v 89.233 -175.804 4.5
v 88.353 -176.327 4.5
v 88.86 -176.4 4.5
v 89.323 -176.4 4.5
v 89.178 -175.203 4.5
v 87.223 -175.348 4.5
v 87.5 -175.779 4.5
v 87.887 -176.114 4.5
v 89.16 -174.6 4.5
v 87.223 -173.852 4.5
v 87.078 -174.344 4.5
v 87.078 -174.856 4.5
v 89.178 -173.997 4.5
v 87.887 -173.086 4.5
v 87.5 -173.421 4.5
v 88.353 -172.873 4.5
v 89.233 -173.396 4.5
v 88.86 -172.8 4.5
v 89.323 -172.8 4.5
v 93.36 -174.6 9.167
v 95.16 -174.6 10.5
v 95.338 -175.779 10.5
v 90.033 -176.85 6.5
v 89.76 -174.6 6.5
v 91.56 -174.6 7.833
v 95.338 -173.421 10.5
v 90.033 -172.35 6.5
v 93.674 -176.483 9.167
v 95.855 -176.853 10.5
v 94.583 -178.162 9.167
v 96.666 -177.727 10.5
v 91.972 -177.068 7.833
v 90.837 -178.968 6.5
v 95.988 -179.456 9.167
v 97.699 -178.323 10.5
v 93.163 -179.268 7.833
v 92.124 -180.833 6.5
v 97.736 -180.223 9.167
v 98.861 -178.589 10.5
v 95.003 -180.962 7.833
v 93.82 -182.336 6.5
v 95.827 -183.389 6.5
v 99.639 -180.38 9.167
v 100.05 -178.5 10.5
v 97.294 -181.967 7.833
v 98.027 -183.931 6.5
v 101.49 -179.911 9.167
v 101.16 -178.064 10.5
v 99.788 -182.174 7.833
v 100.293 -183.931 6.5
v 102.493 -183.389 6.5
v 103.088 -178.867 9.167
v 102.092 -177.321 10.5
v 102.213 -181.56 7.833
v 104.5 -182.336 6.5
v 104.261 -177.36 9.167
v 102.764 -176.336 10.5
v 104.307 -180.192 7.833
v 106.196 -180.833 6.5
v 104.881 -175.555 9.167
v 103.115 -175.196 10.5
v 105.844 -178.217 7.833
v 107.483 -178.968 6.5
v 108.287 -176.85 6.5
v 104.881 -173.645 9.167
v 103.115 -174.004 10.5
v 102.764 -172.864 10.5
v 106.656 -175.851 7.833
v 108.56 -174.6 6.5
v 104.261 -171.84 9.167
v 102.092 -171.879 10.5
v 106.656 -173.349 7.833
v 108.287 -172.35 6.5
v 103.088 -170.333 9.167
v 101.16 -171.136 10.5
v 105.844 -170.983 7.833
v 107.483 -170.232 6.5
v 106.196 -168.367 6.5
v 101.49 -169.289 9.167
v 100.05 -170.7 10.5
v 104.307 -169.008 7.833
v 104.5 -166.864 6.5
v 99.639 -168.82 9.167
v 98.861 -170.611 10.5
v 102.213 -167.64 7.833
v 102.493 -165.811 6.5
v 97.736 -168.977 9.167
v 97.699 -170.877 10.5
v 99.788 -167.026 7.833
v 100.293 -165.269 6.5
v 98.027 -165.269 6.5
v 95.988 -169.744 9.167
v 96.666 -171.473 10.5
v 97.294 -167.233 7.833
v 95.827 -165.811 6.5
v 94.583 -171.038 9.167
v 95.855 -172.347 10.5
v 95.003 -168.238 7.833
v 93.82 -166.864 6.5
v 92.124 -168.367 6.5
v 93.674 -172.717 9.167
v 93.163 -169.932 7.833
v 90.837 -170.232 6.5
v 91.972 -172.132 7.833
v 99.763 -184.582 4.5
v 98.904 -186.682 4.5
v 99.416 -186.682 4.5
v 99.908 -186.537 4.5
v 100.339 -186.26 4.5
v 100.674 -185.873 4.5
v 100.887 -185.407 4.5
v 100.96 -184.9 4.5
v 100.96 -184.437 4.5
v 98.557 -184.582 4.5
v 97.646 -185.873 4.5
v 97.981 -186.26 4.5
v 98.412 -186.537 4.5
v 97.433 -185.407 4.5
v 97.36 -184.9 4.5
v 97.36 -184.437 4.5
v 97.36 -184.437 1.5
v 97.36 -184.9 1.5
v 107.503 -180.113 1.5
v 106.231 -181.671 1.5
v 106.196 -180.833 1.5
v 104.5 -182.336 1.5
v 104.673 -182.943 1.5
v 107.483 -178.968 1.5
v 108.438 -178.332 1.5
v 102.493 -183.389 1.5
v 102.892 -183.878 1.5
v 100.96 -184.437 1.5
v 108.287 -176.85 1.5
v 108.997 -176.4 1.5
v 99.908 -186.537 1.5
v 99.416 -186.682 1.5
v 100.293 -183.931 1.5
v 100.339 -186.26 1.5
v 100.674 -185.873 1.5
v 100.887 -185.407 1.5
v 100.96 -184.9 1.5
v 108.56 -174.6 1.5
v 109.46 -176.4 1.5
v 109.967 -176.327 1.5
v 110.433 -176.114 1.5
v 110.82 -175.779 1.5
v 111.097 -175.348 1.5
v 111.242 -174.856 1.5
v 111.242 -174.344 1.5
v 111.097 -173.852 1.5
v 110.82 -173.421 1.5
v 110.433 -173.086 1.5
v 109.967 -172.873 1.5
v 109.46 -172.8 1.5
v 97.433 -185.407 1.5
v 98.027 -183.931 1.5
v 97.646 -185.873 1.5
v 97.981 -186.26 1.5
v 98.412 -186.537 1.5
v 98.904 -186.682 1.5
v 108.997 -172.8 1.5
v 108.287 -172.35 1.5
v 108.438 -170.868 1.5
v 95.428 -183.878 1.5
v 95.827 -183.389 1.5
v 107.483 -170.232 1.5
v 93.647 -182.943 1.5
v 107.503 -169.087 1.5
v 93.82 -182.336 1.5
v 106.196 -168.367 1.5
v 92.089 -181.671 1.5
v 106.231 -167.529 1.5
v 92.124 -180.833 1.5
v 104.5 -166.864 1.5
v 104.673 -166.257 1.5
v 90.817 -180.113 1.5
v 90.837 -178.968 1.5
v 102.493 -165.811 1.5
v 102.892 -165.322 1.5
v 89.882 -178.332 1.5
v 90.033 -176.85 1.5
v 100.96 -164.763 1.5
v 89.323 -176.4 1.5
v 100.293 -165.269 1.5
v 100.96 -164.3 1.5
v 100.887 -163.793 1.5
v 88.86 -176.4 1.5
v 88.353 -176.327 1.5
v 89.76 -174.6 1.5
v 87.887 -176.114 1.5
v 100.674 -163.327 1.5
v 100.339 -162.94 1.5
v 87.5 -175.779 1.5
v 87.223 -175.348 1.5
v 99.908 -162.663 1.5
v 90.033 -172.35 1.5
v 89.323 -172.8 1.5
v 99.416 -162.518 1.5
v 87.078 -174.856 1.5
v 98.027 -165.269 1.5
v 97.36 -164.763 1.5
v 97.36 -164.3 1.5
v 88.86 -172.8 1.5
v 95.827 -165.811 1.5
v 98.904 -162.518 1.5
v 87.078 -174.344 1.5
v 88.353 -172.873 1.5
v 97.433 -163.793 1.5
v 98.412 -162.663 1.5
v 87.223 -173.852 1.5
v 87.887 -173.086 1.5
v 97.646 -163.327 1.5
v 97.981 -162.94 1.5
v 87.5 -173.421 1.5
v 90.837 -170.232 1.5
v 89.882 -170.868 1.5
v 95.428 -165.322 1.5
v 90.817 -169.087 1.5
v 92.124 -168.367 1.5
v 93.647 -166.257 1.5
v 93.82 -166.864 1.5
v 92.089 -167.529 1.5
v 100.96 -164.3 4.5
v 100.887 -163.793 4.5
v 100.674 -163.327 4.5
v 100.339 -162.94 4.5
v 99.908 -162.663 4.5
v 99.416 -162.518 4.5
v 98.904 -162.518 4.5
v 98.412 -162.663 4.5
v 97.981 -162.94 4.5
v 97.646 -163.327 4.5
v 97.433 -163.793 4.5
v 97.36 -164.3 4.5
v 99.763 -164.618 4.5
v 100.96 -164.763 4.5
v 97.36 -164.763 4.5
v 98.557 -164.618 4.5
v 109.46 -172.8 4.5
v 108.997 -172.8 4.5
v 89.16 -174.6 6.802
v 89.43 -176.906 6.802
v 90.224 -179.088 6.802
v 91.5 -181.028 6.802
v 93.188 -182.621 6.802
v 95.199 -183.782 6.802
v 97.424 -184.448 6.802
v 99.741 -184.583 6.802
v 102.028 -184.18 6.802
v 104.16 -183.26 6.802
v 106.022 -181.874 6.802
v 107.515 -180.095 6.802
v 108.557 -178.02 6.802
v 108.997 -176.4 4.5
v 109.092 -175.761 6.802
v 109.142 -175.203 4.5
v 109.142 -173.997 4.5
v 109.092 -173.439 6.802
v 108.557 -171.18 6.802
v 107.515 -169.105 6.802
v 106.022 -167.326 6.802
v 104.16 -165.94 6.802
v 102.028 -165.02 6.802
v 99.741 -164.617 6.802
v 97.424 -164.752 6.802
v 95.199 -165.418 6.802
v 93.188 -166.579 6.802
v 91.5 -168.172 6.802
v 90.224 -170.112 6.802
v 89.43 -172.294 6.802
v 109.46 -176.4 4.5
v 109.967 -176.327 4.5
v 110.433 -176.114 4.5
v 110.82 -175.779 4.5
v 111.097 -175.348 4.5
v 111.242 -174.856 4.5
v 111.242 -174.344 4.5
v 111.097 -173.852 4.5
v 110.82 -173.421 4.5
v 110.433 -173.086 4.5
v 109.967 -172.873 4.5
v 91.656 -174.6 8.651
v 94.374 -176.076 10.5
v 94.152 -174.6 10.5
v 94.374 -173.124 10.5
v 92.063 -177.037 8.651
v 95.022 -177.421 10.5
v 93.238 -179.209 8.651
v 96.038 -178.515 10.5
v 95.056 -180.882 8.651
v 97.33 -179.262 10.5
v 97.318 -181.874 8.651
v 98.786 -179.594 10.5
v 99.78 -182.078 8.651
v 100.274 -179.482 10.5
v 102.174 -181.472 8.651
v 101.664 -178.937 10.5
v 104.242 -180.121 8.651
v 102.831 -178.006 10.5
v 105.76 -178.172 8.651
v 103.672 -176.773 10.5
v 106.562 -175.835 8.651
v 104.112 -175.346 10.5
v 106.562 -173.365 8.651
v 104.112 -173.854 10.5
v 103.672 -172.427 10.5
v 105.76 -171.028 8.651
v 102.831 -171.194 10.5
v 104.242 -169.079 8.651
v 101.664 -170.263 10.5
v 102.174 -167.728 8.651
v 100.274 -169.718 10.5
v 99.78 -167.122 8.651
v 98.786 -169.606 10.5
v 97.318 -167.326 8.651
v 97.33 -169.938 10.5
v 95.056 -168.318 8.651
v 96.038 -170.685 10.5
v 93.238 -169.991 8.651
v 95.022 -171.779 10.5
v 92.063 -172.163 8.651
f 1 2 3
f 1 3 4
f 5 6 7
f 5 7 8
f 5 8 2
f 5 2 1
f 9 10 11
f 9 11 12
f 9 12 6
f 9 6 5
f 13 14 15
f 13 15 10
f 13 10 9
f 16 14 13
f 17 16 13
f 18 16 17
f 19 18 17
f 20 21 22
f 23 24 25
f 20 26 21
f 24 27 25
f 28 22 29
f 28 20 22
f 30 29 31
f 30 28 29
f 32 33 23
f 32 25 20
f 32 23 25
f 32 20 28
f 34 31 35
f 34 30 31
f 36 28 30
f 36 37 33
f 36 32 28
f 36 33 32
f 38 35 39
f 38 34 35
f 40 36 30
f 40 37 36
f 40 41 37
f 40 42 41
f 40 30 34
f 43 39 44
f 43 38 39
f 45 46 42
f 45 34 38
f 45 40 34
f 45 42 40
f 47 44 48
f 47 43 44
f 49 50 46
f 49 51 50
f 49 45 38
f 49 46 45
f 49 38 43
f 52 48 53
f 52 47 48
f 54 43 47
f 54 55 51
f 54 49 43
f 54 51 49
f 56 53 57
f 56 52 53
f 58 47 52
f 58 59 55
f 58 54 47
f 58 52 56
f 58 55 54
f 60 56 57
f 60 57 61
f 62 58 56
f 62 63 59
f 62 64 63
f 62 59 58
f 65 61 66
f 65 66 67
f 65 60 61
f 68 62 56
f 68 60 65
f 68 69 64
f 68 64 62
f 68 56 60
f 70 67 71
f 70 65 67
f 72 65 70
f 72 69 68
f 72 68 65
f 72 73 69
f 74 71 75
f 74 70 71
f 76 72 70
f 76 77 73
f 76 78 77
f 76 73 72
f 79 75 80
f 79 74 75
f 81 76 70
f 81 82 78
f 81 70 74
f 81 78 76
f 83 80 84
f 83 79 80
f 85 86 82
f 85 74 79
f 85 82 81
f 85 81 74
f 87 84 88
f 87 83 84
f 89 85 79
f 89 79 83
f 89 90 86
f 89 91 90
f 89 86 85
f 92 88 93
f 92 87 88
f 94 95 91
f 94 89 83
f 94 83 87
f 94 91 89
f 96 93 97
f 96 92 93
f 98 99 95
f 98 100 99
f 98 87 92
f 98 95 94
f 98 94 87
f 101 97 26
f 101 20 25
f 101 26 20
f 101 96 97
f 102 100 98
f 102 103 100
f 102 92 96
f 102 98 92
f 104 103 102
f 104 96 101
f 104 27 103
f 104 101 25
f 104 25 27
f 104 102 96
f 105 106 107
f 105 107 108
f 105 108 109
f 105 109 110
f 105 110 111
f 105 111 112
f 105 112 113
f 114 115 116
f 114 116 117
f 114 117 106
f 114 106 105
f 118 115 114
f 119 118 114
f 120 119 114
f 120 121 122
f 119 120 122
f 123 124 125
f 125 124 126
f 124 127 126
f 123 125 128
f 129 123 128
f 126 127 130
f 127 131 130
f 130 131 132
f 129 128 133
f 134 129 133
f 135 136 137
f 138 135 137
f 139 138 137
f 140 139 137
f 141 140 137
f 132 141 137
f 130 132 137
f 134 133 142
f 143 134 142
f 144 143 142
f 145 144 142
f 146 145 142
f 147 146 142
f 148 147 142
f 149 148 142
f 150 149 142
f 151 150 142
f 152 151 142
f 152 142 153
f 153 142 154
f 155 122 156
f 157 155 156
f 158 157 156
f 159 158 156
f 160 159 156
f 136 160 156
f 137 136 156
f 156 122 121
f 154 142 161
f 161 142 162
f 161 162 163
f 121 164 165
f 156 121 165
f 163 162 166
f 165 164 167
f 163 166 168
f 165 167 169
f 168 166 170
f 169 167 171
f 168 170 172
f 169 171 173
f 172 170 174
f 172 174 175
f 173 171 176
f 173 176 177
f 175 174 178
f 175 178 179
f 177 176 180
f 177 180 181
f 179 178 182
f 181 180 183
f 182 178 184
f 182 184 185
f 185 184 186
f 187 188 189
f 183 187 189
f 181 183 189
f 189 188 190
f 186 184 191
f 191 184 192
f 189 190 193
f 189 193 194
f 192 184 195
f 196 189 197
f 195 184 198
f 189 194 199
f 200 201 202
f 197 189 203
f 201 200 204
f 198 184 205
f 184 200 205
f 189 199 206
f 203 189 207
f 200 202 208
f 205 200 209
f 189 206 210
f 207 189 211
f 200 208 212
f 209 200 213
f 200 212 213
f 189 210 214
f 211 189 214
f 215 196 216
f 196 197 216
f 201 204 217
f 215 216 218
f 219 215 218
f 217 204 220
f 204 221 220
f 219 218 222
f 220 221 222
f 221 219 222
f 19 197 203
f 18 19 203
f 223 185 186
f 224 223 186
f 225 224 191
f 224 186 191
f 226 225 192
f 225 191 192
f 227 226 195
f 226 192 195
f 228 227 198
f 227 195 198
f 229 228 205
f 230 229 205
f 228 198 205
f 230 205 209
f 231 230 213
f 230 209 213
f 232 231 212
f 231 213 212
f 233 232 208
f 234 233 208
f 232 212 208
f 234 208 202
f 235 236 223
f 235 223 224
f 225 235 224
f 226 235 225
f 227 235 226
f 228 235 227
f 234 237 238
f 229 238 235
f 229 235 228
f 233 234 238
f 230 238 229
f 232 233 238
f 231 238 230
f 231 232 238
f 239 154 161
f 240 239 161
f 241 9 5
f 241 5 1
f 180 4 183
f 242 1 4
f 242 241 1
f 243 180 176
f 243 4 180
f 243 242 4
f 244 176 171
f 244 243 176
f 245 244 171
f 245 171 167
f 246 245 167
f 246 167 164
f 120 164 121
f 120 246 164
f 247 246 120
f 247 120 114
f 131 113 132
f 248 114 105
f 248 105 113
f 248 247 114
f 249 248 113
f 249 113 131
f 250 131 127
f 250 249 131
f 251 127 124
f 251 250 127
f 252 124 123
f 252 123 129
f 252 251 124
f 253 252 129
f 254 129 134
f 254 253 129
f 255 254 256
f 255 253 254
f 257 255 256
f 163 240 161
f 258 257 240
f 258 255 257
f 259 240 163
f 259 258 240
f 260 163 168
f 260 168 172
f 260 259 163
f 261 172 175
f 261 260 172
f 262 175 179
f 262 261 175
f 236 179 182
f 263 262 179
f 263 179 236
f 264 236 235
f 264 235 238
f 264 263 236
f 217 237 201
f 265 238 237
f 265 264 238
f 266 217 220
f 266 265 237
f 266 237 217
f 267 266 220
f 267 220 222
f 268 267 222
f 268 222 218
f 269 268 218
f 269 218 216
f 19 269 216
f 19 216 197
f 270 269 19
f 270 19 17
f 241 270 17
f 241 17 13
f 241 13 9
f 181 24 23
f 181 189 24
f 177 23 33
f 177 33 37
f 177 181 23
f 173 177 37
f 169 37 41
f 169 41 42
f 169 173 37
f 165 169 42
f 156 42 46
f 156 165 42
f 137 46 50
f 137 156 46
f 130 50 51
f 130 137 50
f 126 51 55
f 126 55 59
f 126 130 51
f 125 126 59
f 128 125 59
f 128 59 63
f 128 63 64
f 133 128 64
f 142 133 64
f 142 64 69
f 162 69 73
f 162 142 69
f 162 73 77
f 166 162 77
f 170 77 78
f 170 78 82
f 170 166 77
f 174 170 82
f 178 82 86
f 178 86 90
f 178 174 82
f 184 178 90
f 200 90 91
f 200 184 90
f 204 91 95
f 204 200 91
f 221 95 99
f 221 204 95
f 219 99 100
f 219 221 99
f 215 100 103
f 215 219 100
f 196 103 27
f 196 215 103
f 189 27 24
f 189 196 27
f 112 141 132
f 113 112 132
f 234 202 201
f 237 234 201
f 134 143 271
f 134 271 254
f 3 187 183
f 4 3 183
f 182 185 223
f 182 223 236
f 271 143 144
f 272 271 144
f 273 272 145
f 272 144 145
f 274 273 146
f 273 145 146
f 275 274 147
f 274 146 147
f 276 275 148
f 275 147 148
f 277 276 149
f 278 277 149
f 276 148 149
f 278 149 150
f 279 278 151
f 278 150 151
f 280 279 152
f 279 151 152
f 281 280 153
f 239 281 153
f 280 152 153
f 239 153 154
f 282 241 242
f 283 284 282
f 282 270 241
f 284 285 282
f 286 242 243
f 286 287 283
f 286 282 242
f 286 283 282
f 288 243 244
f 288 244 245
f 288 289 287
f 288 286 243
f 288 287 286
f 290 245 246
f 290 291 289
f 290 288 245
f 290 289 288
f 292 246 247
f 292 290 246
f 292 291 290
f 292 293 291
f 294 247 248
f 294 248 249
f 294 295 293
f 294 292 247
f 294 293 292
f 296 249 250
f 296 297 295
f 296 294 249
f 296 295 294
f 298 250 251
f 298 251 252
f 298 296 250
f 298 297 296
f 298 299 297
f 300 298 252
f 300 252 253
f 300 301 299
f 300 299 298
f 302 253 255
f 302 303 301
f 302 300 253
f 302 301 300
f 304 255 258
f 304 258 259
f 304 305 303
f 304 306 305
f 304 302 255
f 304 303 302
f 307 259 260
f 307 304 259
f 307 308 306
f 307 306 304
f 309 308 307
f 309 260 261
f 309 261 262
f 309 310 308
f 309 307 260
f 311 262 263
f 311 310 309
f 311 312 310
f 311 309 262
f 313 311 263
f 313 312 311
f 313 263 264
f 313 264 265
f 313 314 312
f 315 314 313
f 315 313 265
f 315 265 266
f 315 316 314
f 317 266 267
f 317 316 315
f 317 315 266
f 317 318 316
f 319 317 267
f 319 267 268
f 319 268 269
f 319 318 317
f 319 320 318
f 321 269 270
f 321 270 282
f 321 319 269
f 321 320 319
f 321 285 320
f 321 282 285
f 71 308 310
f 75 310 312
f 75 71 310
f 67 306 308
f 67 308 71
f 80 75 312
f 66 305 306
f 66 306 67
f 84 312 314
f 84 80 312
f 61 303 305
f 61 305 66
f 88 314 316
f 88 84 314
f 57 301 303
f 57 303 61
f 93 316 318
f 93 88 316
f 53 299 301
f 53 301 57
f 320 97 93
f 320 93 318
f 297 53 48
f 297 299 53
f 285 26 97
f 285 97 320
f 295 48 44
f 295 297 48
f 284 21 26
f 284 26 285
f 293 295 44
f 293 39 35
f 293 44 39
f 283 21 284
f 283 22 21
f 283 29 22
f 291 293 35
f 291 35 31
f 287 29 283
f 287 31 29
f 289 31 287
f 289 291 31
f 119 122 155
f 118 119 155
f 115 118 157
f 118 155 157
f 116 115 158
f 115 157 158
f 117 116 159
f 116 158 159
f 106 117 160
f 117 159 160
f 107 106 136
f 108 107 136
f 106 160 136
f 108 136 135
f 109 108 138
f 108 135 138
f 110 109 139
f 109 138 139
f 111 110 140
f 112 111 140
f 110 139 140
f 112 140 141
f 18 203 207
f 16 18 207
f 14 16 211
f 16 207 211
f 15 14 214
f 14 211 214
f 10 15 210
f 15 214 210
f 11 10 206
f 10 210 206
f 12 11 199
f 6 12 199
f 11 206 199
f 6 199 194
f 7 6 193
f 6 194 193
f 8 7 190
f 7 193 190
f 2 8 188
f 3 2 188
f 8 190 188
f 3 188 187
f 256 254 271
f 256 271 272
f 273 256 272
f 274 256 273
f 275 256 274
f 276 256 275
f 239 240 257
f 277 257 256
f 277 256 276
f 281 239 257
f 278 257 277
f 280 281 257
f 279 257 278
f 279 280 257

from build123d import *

# Parameters (mm, degrees)
PAD022_DEPTH          = 3
POLARPATTERN001_COUNT = 4


with BuildPart() as part:
    # Sketch042 → Revolution002 (revolve)
    with BuildSketch(Plane.XZ):
        Polygon((-10, 0), (-10, 5.302235), (-5.008018, 9), (-4, 9), (-9.4, 5), (-9.4, 0), align=None)
    revolve(axis=Axis((0, 0, 0), (0, 0, 1)))

    # Sketch043 → Pad022 (new body)
    with BuildSketch(Plane.XY):
        with BuildLine():
            ThreePointArc((-10.3, 1.8), (-12.1, 0), (-10.3, -1.8))
            Line((-10.3, -1.8), (-9.6, -1.8))
            Line((-9.6, -1.8), (-9.6, 1.8))
            Line((-9.6, 1.8), (-10.3, 1.8))
        make_face()
        with BuildLine():
            ThreePointArc((10.3, -1.8), (12.1, 0), (10.3, 1.8))
            Line((10.3, 1.8), (9.6, 1.8))
            Line((9.6, 1.8), (9.6, -1.8))
            Line((10.3, -1.8), (9.6, -1.8))
        make_face()
    pad022 = extrude(amount=PAD022_DEPTH)

    # PolarPattern001: Pad022 ×4 about axis
    polarpattern001_axis = Axis((0, 0, 0), (0, 0, 1))
    for i in range(1, POLARPATTERN001_COUNT):
        add(pad022.rotate(polarpattern001_axis, i * 360 / POLARPATTERN001_COUNT))


with BuildPart() as part_1:
    # Body007 placement: moved
    add(part.part.moved(Location((99.16, -174.6, 1.5))))


solid = part_1.part
